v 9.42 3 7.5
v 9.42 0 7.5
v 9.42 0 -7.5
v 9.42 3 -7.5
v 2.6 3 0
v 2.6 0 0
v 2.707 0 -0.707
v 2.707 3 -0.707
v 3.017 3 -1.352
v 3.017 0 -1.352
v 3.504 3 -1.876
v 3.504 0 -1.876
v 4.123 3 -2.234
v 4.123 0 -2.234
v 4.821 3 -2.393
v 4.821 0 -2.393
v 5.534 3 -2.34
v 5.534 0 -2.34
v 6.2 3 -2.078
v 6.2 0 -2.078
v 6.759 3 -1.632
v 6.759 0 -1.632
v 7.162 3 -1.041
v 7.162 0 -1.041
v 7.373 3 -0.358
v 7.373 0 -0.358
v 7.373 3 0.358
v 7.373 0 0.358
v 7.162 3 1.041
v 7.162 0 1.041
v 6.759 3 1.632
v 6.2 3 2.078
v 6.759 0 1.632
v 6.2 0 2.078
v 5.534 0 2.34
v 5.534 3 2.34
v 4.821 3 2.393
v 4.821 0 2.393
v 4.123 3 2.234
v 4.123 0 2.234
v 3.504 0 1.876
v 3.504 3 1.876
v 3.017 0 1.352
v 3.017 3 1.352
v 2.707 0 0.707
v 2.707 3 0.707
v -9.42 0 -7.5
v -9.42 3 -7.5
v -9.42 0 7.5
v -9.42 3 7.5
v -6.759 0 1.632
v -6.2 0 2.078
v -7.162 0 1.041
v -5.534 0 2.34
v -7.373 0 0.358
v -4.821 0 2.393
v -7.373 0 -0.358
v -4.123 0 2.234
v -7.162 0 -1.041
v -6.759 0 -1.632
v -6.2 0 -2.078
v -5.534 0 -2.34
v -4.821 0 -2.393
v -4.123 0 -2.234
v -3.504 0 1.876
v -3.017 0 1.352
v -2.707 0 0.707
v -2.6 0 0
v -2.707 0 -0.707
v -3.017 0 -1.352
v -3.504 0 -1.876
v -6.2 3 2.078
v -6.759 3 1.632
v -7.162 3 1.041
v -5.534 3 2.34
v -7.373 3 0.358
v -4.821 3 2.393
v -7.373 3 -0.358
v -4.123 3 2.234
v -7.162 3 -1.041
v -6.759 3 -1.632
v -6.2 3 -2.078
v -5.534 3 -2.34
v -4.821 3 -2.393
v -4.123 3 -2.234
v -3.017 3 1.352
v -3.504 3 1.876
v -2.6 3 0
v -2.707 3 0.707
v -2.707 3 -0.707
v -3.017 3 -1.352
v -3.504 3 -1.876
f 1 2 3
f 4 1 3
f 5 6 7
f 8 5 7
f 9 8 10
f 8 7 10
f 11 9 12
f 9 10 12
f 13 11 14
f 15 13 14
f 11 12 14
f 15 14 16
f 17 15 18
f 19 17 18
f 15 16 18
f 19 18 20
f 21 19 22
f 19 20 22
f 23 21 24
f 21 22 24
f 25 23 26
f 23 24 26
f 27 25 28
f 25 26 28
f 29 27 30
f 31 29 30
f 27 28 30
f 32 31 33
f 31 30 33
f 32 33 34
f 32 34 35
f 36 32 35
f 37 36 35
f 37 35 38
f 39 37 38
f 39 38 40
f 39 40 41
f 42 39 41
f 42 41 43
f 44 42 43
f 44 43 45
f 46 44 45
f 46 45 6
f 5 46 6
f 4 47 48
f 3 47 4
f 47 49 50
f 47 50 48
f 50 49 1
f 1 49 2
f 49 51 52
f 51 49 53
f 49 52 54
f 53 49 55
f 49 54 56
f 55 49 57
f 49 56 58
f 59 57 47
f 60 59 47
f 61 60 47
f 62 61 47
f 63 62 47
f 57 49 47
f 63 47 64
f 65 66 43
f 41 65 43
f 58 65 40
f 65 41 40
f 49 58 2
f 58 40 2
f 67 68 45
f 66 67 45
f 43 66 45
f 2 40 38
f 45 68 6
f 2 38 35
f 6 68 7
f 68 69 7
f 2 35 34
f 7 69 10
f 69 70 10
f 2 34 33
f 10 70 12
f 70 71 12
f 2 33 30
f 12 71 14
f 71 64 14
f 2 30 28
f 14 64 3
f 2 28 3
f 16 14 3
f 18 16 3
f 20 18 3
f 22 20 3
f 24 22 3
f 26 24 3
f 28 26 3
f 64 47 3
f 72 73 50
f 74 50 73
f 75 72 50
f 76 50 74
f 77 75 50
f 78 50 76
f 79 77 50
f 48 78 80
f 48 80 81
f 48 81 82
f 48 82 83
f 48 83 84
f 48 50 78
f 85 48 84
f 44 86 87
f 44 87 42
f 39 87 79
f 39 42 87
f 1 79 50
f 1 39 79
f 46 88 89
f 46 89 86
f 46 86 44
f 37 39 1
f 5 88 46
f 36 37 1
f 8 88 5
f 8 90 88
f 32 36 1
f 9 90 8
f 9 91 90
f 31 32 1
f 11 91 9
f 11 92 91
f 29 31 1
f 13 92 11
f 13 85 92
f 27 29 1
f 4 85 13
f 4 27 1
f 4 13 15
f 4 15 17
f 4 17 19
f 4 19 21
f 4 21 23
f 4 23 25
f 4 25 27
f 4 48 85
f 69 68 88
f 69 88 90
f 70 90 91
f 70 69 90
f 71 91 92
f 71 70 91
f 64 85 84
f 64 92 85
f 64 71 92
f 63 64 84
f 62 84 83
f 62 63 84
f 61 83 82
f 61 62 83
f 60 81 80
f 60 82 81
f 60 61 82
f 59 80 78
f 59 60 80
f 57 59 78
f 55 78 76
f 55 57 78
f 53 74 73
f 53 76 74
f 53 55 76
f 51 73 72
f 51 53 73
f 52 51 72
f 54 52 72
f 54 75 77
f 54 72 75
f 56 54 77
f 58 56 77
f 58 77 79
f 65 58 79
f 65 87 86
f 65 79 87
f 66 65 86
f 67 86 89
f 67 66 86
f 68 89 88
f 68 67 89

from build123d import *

# Parameters (mm, degrees)
SKETCH1_W           = 18.84
SKETCH1_H           = 15
BOSS_EXTRUDE1_DEPTH = 3
CUT_EXTRUDE1_START  = -4
SKETCH2_R           = 2.4
CUT_EXTRUDE1_DEPTH  = 5


with BuildPart() as part:
    # Sketch1 → Boss-Extrude1 (new body)
    with BuildSketch(Plane(origin=(0, 0, 0), x_dir=(1, 0, 0), z_dir=(0, 1, 0))):
        Rectangle(SKETCH1_W, SKETCH1_H)
    extrude(amount=BOSS_EXTRUDE1_DEPTH)

    # Sketch2 → Cut-Extrude1 (cut)
    with BuildSketch(Plane(origin=(0, 3, 0), x_dir=(1, 0, 0), z_dir=(0, 1, 0)).offset(CUT_EXTRUDE1_START)):
        with Locations((-5, 0)):
            Circle(SKETCH2_R)
    cut_extrude1 = extrude(amount=CUT_EXTRUDE1_DEPTH, mode=Mode.SUBTRACT)

    # Mirror1: Cut-Extrude1 across plane
    add(cut_extrude1.mirror(Plane(origin=(0, 0, 0), x_dir=(0, 0, 1), z_dir=(1, 0, 0))), mode=Mode.SUBTRACT)


solid = part.part
